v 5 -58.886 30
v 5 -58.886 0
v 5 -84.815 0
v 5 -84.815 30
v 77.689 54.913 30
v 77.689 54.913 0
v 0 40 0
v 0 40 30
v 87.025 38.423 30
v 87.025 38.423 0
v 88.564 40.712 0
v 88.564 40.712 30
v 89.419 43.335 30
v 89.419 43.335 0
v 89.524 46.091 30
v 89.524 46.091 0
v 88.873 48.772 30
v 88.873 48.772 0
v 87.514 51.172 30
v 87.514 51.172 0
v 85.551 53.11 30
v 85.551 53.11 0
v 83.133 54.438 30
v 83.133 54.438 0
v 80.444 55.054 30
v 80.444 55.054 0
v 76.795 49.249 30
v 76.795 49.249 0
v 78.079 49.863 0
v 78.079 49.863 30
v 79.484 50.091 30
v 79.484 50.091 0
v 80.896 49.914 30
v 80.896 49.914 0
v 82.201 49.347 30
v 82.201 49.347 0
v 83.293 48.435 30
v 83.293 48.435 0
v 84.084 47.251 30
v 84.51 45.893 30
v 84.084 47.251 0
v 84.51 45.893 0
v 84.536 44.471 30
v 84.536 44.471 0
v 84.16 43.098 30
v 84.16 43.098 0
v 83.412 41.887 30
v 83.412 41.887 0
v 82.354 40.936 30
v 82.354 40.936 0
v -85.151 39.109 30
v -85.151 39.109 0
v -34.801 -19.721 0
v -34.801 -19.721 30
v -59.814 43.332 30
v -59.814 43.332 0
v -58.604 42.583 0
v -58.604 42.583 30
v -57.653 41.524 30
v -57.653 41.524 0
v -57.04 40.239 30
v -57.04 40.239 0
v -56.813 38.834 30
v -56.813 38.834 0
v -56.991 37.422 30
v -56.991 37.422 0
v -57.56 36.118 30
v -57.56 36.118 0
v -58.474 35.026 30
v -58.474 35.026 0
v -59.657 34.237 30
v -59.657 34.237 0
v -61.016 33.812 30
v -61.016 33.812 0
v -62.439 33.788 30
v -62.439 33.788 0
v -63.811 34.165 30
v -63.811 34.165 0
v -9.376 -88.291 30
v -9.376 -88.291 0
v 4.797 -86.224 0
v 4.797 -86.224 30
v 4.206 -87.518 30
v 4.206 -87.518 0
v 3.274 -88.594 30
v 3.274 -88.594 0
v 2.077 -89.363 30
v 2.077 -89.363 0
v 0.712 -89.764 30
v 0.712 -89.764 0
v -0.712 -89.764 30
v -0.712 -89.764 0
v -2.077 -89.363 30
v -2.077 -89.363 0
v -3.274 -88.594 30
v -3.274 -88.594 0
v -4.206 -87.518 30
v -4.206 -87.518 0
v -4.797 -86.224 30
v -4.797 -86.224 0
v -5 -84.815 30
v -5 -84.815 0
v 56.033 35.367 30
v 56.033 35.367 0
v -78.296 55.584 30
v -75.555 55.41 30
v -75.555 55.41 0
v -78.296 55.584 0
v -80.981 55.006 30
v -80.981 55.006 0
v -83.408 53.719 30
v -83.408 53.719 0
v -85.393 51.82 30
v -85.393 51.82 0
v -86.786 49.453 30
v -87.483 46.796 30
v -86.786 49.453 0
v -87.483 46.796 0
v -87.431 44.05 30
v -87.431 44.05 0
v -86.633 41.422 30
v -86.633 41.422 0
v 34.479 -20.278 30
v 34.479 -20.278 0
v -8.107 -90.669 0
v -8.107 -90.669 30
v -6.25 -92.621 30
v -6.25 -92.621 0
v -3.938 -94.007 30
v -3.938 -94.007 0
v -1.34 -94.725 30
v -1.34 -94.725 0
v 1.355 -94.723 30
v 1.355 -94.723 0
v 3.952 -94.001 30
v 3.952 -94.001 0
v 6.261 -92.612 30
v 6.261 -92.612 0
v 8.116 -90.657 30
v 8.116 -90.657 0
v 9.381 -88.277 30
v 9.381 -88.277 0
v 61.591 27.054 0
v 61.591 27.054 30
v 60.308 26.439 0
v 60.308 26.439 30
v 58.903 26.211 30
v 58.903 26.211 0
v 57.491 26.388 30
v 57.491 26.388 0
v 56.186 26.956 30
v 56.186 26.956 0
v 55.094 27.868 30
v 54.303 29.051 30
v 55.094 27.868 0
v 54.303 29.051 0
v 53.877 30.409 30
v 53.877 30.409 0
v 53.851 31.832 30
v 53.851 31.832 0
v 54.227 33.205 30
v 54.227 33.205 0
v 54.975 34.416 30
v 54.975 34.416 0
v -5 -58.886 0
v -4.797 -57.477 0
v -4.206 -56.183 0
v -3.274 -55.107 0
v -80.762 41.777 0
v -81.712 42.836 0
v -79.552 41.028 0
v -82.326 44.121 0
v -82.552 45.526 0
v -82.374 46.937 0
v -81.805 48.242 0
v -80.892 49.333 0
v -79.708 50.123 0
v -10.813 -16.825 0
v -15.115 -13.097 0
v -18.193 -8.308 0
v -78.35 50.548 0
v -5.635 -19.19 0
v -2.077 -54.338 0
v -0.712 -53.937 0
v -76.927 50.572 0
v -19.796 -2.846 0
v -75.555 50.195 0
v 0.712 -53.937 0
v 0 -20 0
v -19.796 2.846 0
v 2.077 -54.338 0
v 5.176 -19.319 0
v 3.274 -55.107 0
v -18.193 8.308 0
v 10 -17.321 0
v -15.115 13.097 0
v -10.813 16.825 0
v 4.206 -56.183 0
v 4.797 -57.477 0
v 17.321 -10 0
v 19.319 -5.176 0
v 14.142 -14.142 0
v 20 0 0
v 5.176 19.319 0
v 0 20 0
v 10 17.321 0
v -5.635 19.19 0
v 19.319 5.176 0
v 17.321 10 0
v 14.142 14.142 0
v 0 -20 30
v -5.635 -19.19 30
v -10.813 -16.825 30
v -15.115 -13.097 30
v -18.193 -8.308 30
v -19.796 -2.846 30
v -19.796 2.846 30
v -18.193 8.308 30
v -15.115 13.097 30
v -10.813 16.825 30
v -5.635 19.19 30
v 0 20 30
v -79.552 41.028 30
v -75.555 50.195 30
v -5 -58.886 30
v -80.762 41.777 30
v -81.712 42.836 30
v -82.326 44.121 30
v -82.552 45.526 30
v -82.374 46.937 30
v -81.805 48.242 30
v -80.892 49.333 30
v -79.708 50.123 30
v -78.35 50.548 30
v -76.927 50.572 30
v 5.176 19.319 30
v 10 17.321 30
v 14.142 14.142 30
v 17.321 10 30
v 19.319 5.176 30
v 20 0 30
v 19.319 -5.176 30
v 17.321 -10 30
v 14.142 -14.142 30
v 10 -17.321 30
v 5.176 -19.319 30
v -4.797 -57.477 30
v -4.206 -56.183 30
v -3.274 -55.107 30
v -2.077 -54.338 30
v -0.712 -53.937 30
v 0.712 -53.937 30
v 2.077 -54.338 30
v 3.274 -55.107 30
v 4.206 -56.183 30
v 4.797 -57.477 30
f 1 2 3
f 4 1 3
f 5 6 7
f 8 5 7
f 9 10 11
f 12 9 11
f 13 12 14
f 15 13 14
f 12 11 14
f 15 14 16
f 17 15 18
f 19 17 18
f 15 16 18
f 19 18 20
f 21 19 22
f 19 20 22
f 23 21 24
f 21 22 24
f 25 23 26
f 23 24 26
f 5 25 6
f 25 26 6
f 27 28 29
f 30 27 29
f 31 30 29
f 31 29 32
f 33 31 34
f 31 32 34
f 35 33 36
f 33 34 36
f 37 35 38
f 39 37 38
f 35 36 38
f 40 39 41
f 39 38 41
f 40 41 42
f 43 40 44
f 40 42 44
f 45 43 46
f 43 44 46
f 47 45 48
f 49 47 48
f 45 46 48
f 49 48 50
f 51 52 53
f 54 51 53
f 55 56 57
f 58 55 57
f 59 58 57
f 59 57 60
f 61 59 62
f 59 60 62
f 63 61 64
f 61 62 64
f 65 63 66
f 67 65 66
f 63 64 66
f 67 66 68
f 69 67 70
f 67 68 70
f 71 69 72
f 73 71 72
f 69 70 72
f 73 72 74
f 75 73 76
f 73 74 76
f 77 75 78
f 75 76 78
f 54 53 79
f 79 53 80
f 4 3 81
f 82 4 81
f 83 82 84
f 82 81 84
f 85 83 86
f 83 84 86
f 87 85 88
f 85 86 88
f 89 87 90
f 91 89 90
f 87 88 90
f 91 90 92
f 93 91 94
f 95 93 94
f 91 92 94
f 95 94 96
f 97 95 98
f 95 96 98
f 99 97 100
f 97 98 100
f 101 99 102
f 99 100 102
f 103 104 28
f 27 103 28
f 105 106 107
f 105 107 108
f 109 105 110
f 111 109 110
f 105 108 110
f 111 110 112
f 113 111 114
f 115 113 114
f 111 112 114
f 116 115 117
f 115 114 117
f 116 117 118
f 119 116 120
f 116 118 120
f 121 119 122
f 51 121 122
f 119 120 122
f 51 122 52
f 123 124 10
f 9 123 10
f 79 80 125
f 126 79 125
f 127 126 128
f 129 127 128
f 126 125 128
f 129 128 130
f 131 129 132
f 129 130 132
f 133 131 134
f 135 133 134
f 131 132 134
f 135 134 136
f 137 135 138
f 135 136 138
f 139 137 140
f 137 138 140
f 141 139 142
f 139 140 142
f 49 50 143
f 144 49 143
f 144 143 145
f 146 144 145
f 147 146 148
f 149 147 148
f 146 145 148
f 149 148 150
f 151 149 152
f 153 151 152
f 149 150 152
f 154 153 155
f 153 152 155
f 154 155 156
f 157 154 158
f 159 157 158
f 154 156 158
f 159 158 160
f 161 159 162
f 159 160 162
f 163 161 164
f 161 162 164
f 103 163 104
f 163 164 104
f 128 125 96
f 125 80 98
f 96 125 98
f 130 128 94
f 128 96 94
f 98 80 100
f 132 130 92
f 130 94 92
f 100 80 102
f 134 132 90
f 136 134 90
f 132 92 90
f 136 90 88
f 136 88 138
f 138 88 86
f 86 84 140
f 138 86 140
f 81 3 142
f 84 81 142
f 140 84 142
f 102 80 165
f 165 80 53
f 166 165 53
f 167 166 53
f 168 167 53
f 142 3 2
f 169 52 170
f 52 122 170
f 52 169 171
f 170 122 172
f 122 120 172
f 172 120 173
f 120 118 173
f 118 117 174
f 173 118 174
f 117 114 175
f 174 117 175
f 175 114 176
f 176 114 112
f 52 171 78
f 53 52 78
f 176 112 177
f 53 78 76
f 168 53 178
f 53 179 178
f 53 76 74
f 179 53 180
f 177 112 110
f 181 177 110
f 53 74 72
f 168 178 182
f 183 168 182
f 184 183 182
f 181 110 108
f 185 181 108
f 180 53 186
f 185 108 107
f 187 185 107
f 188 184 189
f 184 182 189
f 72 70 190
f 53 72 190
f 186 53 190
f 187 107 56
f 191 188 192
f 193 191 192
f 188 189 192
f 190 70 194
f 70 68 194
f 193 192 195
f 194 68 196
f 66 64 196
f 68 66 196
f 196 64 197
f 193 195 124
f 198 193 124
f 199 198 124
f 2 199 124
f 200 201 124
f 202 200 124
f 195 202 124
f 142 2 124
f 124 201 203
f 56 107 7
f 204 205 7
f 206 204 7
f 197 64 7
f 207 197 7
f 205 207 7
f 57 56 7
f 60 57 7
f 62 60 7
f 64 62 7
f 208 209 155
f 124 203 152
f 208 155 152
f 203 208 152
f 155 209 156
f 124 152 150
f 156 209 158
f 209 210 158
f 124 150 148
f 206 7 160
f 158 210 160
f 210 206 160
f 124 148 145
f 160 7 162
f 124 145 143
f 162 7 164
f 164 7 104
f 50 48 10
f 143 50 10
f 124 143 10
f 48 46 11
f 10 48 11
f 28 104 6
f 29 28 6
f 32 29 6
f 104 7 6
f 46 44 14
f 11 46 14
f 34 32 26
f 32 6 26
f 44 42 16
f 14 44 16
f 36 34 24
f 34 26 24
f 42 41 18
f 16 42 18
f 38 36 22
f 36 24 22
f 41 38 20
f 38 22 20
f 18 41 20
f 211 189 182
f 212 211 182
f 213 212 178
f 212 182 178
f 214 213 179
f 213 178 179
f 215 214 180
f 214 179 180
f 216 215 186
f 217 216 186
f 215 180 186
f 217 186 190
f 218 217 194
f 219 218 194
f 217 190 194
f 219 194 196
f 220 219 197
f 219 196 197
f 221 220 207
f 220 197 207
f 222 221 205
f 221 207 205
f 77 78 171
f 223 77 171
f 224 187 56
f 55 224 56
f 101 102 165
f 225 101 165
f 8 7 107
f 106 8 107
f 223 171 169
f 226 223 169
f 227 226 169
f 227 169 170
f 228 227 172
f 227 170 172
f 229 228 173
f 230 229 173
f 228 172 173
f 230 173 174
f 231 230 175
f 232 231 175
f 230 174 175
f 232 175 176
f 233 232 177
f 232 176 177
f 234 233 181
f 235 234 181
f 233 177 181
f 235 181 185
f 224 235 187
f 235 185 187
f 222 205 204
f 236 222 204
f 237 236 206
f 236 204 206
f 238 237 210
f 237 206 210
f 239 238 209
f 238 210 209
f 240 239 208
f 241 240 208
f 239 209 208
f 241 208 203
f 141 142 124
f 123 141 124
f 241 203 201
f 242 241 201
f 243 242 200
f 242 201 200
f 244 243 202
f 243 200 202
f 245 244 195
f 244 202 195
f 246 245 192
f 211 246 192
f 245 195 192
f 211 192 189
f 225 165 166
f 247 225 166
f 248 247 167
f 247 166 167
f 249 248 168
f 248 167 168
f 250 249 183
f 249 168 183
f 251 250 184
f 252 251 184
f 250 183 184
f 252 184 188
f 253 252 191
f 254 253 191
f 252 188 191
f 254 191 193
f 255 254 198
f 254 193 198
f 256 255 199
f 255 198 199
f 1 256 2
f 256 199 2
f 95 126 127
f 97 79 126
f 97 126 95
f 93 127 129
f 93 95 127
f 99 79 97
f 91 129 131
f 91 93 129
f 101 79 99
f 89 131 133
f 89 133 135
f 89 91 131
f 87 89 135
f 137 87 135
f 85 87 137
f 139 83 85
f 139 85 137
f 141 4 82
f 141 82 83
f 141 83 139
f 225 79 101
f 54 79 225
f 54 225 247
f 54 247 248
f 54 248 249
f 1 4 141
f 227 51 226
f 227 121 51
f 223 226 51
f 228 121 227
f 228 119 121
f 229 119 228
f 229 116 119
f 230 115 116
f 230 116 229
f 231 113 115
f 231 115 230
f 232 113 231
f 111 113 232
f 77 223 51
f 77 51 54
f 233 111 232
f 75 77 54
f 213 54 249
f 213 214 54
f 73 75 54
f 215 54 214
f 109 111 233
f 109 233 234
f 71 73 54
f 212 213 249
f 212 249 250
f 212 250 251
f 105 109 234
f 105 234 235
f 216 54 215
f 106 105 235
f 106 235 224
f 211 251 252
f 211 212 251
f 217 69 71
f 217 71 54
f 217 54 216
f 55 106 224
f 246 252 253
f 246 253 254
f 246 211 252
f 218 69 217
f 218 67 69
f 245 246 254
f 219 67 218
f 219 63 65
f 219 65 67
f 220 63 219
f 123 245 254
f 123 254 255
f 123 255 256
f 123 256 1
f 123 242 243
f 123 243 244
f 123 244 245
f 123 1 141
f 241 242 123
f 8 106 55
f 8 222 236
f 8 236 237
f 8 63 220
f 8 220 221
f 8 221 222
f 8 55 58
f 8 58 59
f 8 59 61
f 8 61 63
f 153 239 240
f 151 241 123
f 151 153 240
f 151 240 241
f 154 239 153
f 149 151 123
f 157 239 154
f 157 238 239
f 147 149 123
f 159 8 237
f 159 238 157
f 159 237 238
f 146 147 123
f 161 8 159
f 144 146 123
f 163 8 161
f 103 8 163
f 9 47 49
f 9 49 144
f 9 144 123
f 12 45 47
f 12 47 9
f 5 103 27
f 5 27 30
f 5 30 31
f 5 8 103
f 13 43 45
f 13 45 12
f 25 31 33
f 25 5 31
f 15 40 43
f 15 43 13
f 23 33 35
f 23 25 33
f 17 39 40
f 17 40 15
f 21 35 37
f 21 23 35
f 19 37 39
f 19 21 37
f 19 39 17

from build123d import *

# Parameters (mm, degrees)
F1_DEPTH = 30


with BuildPart() as f1:
    # F0 (on Top) → F1 (new body)
    with BuildSketch(Plane.XY):
        with BuildLine():
            ThreePointArc((34.478903, -20.278196), (19.860415, -34.721231), (0, -40))
            ThreePointArc((0, -40), (-20.139261, -34.56024), (-34.800884, -19.720508))
            Line((-34.800884, -19.720508), (-9.376239, -88.291404))
            ThreePointArc((-9.376239, -88.291404), (0.00745, -94.814889), (9.381409, -88.277428))
            Line((9.381409, -88.277428), (34.478903, -20.278196))
        make_face()
        with BuildLine():
            ThreePointArc((5, -84.814891), (0, -89.814891), (-5, -84.814891))
            Line((-5, -84.814891), (-5, -58.885846))
            ThreePointArc((-5, -58.885846), (0, -53.885846), (5, -58.885846))
            Line((5, -58.885846), (5, -84.814891))
        make_face(mode=Mode.SUBTRACT)
        with BuildLine():
            ThreePointArc((0, 20), (14.142136, 14.142136), (20, 0))
            ThreePointArc((20, 0), (14.142136, -14.142136), (0, -20))
            Line((0, -20), (0, -40))
            ThreePointArc((0, -40), (19.860415, -34.721231), (34.478903, -20.278196))
            ThreePointArc((34.478903, -20.278196), (38.595052, -10.508184), (40, 0))
            ThreePointArc((40, 0), (28.284271, 28.284271), (0, 40))
            Line((0, 40), (0, 20))
        make_face()
        with BuildLine():
            ThreePointArc((0, -20), (-20, 0), (0, 20))
            Line((0, 20), (0, 40))
            ThreePointArc((0, 40), (-34.56024, 20.139261), (-34.800884, -19.720508))
            ThreePointArc((-34.800884, -19.720508), (-20.139261, -34.56024), (0, -40))
            Line((0, -40), (0, -20))
        make_face()
        with BuildLine():
            ThreePointArc((-34.800884, -19.720508), (-34.56024, 20.139261), (0, 40))
            Line((0, 40), (-75.554794, 55.409922))
            ThreePointArc((-75.554794, 55.409922), (-86.170881, 50.684701), (-85.150626, 39.109378))
            Line((-85.150626, 39.109378), (-34.800884, -19.720508))
        make_face()
        with BuildLine():
            ThreePointArc((-79.551648, 41.02838), (-82.136483, 47.610069), (-75.554794, 50.194904))
            Line((-75.554794, 50.194904), (-59.814075, 43.331522))
            ThreePointArc((-59.814075, 43.331522), (-57.22924, 36.749833), (-63.810929, 34.164998))
            Line((-63.810929, 34.164998), (-79.551648, 41.02838))
        make_face(mode=Mode.SUBTRACT)
        with BuildLine():
            Line((77.689324, 54.912919), (0, 40))
            ThreePointArc((0, 40), (28.284271, 28.284271), (40, 0))
            ThreePointArc((40, 0), (38.595052, -10.508184), (34.478903, -20.278196))
            Line((34.478903, -20.278196), (87.025319, 38.422523))
            ThreePointArc((87.025319, 38.422523), (88.276625, 50.018919), (77.689324, 54.912919))
        make_face()
        with BuildLine():
            ThreePointArc((76.795383, 49.248739), (83.73099, 47.871297), (82.353549, 40.935689))
            Line((82.353549, 40.935689), (61.591367, 27.053942))
            ThreePointArc((61.591367, 27.053942), (54.655759, 28.431383), (56.033201, 35.366991))
            Line((56.033201, 35.366991), (76.795383, 49.248739))
        make_face(mode=Mode.SUBTRACT)
    extrude(amount=F1_DEPTH)


solid = f1.part
